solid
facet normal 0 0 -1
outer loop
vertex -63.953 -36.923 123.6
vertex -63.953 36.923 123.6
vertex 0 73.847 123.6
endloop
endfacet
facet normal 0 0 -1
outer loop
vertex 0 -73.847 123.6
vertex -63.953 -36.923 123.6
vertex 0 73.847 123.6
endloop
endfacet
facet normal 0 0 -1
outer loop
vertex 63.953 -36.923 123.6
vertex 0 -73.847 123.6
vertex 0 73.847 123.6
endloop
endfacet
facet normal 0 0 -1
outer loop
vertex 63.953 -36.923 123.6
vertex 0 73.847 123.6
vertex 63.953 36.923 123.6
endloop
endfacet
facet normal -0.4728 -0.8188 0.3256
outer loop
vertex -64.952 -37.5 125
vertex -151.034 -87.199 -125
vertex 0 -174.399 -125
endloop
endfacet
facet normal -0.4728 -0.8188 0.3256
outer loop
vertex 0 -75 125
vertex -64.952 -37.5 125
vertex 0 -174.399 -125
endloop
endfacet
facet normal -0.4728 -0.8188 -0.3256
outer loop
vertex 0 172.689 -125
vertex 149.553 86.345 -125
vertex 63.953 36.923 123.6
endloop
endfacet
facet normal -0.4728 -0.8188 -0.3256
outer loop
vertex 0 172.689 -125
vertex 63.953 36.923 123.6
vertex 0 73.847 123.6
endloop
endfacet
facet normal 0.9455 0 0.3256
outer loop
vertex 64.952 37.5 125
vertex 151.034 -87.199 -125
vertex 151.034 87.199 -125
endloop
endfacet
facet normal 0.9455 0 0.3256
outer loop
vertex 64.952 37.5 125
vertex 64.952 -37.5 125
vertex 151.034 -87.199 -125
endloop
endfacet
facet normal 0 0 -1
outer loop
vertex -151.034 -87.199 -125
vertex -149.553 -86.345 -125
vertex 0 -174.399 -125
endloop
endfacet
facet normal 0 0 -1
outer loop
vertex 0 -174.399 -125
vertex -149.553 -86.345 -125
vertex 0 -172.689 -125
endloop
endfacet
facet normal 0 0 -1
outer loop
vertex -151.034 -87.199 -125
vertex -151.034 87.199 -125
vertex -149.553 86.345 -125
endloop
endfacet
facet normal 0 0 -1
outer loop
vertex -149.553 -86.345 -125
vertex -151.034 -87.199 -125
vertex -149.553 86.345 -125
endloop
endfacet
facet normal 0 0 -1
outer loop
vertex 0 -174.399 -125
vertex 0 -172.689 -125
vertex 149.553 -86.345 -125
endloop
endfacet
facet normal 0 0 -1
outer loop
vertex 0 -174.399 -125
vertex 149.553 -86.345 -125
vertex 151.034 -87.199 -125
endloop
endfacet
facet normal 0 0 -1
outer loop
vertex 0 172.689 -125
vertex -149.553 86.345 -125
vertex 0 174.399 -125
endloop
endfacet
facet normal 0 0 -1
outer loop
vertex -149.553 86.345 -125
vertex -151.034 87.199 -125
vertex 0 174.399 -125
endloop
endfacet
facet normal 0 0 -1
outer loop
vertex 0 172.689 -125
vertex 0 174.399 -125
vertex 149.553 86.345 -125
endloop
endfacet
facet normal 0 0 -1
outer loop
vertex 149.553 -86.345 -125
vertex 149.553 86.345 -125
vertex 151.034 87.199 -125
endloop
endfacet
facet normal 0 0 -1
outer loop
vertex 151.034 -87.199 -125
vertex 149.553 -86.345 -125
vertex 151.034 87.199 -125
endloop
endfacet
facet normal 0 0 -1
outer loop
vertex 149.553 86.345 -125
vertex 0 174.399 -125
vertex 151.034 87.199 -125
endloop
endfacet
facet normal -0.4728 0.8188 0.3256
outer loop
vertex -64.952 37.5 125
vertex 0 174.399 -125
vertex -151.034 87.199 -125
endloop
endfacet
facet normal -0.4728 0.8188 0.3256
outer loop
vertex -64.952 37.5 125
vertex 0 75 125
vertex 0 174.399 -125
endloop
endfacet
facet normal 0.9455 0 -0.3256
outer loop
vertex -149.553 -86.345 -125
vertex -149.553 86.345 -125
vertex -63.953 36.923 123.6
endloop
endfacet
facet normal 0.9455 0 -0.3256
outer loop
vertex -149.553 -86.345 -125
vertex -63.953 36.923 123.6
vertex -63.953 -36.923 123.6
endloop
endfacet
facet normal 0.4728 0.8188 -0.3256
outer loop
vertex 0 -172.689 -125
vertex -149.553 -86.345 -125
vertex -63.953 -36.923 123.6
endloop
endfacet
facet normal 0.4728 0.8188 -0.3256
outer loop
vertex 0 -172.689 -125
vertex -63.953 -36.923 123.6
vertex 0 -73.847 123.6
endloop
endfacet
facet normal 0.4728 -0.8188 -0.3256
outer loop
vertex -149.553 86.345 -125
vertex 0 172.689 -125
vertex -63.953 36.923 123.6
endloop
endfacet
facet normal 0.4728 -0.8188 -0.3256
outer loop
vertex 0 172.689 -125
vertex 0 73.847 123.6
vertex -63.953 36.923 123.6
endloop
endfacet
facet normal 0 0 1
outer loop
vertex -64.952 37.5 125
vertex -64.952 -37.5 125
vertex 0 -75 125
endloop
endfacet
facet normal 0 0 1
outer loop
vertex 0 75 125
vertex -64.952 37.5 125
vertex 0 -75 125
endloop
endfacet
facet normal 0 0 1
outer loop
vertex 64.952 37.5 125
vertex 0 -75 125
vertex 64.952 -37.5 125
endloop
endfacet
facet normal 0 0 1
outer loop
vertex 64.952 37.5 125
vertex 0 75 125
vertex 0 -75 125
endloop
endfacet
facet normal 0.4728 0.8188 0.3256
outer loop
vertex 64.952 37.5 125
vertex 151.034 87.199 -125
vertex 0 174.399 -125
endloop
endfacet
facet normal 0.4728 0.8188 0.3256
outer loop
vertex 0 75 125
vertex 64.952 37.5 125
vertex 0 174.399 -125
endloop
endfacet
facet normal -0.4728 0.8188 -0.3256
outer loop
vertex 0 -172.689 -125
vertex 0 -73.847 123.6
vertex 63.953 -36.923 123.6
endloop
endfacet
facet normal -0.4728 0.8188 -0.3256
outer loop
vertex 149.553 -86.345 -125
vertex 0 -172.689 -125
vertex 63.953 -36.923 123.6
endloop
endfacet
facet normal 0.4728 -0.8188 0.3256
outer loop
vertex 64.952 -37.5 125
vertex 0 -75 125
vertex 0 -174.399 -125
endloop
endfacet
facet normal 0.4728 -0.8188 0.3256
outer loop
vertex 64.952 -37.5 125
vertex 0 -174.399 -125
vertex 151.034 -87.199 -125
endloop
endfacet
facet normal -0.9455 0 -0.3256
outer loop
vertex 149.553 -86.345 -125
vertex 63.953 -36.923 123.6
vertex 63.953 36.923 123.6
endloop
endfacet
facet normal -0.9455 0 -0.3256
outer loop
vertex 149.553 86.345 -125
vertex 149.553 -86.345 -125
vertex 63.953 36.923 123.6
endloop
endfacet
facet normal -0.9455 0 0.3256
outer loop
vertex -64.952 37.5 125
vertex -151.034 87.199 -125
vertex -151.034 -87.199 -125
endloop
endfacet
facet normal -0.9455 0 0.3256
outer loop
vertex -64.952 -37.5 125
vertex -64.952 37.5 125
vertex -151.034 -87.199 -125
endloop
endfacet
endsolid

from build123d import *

# Parameters (mm, degrees)
SALIENTE_EXTRUIR1_DEPTH = 125
NGULO_DE_SALIDA1_ANGLE  = 19
VACIADO1_T              = -1.4


with BuildPart() as part:
    # Croquis1 → Saliente-Extruir1 (new, symmetric)
    with BuildSketch(Plane.XY):
        Polygon((0, 75), (-64.951905284, 37.5), (-64.951905284, -37.5), (0, -75), (64.951905284, -37.5), (64.951905284, 37.5), align=None)
    extrude(amount=SALIENTE_EXTRUIR1_DEPTH, both=True)

    # Ángulo de salida1
    ngulo_de_salida1_faces = [part.faces().sort_by_distance(p)[0] for p in [
        (-32.475952642, 56.25, 0),
        (-64.951905284, 0, 0),
        (-32.475952642, -56.25, 0),
        (32.475952642, 56.25, 0),
        (64.951905284, 0, 0),
        (32.475952642, -56.25, 0),
    ]]
    draft(ngulo_de_salida1_faces, Plane.XY.offset(125), NGULO_DE_SALIDA1_ANGLE)

    # Vaciado1
    vaciado1_openings = [part.faces().sort_by_distance(p)[0] for p in [
        (0, 0, -125),
    ]]
    offset(amount=VACIADO1_T, openings=vaciado1_openings, kind=Kind.INTERSECTION)


solid = part.part
